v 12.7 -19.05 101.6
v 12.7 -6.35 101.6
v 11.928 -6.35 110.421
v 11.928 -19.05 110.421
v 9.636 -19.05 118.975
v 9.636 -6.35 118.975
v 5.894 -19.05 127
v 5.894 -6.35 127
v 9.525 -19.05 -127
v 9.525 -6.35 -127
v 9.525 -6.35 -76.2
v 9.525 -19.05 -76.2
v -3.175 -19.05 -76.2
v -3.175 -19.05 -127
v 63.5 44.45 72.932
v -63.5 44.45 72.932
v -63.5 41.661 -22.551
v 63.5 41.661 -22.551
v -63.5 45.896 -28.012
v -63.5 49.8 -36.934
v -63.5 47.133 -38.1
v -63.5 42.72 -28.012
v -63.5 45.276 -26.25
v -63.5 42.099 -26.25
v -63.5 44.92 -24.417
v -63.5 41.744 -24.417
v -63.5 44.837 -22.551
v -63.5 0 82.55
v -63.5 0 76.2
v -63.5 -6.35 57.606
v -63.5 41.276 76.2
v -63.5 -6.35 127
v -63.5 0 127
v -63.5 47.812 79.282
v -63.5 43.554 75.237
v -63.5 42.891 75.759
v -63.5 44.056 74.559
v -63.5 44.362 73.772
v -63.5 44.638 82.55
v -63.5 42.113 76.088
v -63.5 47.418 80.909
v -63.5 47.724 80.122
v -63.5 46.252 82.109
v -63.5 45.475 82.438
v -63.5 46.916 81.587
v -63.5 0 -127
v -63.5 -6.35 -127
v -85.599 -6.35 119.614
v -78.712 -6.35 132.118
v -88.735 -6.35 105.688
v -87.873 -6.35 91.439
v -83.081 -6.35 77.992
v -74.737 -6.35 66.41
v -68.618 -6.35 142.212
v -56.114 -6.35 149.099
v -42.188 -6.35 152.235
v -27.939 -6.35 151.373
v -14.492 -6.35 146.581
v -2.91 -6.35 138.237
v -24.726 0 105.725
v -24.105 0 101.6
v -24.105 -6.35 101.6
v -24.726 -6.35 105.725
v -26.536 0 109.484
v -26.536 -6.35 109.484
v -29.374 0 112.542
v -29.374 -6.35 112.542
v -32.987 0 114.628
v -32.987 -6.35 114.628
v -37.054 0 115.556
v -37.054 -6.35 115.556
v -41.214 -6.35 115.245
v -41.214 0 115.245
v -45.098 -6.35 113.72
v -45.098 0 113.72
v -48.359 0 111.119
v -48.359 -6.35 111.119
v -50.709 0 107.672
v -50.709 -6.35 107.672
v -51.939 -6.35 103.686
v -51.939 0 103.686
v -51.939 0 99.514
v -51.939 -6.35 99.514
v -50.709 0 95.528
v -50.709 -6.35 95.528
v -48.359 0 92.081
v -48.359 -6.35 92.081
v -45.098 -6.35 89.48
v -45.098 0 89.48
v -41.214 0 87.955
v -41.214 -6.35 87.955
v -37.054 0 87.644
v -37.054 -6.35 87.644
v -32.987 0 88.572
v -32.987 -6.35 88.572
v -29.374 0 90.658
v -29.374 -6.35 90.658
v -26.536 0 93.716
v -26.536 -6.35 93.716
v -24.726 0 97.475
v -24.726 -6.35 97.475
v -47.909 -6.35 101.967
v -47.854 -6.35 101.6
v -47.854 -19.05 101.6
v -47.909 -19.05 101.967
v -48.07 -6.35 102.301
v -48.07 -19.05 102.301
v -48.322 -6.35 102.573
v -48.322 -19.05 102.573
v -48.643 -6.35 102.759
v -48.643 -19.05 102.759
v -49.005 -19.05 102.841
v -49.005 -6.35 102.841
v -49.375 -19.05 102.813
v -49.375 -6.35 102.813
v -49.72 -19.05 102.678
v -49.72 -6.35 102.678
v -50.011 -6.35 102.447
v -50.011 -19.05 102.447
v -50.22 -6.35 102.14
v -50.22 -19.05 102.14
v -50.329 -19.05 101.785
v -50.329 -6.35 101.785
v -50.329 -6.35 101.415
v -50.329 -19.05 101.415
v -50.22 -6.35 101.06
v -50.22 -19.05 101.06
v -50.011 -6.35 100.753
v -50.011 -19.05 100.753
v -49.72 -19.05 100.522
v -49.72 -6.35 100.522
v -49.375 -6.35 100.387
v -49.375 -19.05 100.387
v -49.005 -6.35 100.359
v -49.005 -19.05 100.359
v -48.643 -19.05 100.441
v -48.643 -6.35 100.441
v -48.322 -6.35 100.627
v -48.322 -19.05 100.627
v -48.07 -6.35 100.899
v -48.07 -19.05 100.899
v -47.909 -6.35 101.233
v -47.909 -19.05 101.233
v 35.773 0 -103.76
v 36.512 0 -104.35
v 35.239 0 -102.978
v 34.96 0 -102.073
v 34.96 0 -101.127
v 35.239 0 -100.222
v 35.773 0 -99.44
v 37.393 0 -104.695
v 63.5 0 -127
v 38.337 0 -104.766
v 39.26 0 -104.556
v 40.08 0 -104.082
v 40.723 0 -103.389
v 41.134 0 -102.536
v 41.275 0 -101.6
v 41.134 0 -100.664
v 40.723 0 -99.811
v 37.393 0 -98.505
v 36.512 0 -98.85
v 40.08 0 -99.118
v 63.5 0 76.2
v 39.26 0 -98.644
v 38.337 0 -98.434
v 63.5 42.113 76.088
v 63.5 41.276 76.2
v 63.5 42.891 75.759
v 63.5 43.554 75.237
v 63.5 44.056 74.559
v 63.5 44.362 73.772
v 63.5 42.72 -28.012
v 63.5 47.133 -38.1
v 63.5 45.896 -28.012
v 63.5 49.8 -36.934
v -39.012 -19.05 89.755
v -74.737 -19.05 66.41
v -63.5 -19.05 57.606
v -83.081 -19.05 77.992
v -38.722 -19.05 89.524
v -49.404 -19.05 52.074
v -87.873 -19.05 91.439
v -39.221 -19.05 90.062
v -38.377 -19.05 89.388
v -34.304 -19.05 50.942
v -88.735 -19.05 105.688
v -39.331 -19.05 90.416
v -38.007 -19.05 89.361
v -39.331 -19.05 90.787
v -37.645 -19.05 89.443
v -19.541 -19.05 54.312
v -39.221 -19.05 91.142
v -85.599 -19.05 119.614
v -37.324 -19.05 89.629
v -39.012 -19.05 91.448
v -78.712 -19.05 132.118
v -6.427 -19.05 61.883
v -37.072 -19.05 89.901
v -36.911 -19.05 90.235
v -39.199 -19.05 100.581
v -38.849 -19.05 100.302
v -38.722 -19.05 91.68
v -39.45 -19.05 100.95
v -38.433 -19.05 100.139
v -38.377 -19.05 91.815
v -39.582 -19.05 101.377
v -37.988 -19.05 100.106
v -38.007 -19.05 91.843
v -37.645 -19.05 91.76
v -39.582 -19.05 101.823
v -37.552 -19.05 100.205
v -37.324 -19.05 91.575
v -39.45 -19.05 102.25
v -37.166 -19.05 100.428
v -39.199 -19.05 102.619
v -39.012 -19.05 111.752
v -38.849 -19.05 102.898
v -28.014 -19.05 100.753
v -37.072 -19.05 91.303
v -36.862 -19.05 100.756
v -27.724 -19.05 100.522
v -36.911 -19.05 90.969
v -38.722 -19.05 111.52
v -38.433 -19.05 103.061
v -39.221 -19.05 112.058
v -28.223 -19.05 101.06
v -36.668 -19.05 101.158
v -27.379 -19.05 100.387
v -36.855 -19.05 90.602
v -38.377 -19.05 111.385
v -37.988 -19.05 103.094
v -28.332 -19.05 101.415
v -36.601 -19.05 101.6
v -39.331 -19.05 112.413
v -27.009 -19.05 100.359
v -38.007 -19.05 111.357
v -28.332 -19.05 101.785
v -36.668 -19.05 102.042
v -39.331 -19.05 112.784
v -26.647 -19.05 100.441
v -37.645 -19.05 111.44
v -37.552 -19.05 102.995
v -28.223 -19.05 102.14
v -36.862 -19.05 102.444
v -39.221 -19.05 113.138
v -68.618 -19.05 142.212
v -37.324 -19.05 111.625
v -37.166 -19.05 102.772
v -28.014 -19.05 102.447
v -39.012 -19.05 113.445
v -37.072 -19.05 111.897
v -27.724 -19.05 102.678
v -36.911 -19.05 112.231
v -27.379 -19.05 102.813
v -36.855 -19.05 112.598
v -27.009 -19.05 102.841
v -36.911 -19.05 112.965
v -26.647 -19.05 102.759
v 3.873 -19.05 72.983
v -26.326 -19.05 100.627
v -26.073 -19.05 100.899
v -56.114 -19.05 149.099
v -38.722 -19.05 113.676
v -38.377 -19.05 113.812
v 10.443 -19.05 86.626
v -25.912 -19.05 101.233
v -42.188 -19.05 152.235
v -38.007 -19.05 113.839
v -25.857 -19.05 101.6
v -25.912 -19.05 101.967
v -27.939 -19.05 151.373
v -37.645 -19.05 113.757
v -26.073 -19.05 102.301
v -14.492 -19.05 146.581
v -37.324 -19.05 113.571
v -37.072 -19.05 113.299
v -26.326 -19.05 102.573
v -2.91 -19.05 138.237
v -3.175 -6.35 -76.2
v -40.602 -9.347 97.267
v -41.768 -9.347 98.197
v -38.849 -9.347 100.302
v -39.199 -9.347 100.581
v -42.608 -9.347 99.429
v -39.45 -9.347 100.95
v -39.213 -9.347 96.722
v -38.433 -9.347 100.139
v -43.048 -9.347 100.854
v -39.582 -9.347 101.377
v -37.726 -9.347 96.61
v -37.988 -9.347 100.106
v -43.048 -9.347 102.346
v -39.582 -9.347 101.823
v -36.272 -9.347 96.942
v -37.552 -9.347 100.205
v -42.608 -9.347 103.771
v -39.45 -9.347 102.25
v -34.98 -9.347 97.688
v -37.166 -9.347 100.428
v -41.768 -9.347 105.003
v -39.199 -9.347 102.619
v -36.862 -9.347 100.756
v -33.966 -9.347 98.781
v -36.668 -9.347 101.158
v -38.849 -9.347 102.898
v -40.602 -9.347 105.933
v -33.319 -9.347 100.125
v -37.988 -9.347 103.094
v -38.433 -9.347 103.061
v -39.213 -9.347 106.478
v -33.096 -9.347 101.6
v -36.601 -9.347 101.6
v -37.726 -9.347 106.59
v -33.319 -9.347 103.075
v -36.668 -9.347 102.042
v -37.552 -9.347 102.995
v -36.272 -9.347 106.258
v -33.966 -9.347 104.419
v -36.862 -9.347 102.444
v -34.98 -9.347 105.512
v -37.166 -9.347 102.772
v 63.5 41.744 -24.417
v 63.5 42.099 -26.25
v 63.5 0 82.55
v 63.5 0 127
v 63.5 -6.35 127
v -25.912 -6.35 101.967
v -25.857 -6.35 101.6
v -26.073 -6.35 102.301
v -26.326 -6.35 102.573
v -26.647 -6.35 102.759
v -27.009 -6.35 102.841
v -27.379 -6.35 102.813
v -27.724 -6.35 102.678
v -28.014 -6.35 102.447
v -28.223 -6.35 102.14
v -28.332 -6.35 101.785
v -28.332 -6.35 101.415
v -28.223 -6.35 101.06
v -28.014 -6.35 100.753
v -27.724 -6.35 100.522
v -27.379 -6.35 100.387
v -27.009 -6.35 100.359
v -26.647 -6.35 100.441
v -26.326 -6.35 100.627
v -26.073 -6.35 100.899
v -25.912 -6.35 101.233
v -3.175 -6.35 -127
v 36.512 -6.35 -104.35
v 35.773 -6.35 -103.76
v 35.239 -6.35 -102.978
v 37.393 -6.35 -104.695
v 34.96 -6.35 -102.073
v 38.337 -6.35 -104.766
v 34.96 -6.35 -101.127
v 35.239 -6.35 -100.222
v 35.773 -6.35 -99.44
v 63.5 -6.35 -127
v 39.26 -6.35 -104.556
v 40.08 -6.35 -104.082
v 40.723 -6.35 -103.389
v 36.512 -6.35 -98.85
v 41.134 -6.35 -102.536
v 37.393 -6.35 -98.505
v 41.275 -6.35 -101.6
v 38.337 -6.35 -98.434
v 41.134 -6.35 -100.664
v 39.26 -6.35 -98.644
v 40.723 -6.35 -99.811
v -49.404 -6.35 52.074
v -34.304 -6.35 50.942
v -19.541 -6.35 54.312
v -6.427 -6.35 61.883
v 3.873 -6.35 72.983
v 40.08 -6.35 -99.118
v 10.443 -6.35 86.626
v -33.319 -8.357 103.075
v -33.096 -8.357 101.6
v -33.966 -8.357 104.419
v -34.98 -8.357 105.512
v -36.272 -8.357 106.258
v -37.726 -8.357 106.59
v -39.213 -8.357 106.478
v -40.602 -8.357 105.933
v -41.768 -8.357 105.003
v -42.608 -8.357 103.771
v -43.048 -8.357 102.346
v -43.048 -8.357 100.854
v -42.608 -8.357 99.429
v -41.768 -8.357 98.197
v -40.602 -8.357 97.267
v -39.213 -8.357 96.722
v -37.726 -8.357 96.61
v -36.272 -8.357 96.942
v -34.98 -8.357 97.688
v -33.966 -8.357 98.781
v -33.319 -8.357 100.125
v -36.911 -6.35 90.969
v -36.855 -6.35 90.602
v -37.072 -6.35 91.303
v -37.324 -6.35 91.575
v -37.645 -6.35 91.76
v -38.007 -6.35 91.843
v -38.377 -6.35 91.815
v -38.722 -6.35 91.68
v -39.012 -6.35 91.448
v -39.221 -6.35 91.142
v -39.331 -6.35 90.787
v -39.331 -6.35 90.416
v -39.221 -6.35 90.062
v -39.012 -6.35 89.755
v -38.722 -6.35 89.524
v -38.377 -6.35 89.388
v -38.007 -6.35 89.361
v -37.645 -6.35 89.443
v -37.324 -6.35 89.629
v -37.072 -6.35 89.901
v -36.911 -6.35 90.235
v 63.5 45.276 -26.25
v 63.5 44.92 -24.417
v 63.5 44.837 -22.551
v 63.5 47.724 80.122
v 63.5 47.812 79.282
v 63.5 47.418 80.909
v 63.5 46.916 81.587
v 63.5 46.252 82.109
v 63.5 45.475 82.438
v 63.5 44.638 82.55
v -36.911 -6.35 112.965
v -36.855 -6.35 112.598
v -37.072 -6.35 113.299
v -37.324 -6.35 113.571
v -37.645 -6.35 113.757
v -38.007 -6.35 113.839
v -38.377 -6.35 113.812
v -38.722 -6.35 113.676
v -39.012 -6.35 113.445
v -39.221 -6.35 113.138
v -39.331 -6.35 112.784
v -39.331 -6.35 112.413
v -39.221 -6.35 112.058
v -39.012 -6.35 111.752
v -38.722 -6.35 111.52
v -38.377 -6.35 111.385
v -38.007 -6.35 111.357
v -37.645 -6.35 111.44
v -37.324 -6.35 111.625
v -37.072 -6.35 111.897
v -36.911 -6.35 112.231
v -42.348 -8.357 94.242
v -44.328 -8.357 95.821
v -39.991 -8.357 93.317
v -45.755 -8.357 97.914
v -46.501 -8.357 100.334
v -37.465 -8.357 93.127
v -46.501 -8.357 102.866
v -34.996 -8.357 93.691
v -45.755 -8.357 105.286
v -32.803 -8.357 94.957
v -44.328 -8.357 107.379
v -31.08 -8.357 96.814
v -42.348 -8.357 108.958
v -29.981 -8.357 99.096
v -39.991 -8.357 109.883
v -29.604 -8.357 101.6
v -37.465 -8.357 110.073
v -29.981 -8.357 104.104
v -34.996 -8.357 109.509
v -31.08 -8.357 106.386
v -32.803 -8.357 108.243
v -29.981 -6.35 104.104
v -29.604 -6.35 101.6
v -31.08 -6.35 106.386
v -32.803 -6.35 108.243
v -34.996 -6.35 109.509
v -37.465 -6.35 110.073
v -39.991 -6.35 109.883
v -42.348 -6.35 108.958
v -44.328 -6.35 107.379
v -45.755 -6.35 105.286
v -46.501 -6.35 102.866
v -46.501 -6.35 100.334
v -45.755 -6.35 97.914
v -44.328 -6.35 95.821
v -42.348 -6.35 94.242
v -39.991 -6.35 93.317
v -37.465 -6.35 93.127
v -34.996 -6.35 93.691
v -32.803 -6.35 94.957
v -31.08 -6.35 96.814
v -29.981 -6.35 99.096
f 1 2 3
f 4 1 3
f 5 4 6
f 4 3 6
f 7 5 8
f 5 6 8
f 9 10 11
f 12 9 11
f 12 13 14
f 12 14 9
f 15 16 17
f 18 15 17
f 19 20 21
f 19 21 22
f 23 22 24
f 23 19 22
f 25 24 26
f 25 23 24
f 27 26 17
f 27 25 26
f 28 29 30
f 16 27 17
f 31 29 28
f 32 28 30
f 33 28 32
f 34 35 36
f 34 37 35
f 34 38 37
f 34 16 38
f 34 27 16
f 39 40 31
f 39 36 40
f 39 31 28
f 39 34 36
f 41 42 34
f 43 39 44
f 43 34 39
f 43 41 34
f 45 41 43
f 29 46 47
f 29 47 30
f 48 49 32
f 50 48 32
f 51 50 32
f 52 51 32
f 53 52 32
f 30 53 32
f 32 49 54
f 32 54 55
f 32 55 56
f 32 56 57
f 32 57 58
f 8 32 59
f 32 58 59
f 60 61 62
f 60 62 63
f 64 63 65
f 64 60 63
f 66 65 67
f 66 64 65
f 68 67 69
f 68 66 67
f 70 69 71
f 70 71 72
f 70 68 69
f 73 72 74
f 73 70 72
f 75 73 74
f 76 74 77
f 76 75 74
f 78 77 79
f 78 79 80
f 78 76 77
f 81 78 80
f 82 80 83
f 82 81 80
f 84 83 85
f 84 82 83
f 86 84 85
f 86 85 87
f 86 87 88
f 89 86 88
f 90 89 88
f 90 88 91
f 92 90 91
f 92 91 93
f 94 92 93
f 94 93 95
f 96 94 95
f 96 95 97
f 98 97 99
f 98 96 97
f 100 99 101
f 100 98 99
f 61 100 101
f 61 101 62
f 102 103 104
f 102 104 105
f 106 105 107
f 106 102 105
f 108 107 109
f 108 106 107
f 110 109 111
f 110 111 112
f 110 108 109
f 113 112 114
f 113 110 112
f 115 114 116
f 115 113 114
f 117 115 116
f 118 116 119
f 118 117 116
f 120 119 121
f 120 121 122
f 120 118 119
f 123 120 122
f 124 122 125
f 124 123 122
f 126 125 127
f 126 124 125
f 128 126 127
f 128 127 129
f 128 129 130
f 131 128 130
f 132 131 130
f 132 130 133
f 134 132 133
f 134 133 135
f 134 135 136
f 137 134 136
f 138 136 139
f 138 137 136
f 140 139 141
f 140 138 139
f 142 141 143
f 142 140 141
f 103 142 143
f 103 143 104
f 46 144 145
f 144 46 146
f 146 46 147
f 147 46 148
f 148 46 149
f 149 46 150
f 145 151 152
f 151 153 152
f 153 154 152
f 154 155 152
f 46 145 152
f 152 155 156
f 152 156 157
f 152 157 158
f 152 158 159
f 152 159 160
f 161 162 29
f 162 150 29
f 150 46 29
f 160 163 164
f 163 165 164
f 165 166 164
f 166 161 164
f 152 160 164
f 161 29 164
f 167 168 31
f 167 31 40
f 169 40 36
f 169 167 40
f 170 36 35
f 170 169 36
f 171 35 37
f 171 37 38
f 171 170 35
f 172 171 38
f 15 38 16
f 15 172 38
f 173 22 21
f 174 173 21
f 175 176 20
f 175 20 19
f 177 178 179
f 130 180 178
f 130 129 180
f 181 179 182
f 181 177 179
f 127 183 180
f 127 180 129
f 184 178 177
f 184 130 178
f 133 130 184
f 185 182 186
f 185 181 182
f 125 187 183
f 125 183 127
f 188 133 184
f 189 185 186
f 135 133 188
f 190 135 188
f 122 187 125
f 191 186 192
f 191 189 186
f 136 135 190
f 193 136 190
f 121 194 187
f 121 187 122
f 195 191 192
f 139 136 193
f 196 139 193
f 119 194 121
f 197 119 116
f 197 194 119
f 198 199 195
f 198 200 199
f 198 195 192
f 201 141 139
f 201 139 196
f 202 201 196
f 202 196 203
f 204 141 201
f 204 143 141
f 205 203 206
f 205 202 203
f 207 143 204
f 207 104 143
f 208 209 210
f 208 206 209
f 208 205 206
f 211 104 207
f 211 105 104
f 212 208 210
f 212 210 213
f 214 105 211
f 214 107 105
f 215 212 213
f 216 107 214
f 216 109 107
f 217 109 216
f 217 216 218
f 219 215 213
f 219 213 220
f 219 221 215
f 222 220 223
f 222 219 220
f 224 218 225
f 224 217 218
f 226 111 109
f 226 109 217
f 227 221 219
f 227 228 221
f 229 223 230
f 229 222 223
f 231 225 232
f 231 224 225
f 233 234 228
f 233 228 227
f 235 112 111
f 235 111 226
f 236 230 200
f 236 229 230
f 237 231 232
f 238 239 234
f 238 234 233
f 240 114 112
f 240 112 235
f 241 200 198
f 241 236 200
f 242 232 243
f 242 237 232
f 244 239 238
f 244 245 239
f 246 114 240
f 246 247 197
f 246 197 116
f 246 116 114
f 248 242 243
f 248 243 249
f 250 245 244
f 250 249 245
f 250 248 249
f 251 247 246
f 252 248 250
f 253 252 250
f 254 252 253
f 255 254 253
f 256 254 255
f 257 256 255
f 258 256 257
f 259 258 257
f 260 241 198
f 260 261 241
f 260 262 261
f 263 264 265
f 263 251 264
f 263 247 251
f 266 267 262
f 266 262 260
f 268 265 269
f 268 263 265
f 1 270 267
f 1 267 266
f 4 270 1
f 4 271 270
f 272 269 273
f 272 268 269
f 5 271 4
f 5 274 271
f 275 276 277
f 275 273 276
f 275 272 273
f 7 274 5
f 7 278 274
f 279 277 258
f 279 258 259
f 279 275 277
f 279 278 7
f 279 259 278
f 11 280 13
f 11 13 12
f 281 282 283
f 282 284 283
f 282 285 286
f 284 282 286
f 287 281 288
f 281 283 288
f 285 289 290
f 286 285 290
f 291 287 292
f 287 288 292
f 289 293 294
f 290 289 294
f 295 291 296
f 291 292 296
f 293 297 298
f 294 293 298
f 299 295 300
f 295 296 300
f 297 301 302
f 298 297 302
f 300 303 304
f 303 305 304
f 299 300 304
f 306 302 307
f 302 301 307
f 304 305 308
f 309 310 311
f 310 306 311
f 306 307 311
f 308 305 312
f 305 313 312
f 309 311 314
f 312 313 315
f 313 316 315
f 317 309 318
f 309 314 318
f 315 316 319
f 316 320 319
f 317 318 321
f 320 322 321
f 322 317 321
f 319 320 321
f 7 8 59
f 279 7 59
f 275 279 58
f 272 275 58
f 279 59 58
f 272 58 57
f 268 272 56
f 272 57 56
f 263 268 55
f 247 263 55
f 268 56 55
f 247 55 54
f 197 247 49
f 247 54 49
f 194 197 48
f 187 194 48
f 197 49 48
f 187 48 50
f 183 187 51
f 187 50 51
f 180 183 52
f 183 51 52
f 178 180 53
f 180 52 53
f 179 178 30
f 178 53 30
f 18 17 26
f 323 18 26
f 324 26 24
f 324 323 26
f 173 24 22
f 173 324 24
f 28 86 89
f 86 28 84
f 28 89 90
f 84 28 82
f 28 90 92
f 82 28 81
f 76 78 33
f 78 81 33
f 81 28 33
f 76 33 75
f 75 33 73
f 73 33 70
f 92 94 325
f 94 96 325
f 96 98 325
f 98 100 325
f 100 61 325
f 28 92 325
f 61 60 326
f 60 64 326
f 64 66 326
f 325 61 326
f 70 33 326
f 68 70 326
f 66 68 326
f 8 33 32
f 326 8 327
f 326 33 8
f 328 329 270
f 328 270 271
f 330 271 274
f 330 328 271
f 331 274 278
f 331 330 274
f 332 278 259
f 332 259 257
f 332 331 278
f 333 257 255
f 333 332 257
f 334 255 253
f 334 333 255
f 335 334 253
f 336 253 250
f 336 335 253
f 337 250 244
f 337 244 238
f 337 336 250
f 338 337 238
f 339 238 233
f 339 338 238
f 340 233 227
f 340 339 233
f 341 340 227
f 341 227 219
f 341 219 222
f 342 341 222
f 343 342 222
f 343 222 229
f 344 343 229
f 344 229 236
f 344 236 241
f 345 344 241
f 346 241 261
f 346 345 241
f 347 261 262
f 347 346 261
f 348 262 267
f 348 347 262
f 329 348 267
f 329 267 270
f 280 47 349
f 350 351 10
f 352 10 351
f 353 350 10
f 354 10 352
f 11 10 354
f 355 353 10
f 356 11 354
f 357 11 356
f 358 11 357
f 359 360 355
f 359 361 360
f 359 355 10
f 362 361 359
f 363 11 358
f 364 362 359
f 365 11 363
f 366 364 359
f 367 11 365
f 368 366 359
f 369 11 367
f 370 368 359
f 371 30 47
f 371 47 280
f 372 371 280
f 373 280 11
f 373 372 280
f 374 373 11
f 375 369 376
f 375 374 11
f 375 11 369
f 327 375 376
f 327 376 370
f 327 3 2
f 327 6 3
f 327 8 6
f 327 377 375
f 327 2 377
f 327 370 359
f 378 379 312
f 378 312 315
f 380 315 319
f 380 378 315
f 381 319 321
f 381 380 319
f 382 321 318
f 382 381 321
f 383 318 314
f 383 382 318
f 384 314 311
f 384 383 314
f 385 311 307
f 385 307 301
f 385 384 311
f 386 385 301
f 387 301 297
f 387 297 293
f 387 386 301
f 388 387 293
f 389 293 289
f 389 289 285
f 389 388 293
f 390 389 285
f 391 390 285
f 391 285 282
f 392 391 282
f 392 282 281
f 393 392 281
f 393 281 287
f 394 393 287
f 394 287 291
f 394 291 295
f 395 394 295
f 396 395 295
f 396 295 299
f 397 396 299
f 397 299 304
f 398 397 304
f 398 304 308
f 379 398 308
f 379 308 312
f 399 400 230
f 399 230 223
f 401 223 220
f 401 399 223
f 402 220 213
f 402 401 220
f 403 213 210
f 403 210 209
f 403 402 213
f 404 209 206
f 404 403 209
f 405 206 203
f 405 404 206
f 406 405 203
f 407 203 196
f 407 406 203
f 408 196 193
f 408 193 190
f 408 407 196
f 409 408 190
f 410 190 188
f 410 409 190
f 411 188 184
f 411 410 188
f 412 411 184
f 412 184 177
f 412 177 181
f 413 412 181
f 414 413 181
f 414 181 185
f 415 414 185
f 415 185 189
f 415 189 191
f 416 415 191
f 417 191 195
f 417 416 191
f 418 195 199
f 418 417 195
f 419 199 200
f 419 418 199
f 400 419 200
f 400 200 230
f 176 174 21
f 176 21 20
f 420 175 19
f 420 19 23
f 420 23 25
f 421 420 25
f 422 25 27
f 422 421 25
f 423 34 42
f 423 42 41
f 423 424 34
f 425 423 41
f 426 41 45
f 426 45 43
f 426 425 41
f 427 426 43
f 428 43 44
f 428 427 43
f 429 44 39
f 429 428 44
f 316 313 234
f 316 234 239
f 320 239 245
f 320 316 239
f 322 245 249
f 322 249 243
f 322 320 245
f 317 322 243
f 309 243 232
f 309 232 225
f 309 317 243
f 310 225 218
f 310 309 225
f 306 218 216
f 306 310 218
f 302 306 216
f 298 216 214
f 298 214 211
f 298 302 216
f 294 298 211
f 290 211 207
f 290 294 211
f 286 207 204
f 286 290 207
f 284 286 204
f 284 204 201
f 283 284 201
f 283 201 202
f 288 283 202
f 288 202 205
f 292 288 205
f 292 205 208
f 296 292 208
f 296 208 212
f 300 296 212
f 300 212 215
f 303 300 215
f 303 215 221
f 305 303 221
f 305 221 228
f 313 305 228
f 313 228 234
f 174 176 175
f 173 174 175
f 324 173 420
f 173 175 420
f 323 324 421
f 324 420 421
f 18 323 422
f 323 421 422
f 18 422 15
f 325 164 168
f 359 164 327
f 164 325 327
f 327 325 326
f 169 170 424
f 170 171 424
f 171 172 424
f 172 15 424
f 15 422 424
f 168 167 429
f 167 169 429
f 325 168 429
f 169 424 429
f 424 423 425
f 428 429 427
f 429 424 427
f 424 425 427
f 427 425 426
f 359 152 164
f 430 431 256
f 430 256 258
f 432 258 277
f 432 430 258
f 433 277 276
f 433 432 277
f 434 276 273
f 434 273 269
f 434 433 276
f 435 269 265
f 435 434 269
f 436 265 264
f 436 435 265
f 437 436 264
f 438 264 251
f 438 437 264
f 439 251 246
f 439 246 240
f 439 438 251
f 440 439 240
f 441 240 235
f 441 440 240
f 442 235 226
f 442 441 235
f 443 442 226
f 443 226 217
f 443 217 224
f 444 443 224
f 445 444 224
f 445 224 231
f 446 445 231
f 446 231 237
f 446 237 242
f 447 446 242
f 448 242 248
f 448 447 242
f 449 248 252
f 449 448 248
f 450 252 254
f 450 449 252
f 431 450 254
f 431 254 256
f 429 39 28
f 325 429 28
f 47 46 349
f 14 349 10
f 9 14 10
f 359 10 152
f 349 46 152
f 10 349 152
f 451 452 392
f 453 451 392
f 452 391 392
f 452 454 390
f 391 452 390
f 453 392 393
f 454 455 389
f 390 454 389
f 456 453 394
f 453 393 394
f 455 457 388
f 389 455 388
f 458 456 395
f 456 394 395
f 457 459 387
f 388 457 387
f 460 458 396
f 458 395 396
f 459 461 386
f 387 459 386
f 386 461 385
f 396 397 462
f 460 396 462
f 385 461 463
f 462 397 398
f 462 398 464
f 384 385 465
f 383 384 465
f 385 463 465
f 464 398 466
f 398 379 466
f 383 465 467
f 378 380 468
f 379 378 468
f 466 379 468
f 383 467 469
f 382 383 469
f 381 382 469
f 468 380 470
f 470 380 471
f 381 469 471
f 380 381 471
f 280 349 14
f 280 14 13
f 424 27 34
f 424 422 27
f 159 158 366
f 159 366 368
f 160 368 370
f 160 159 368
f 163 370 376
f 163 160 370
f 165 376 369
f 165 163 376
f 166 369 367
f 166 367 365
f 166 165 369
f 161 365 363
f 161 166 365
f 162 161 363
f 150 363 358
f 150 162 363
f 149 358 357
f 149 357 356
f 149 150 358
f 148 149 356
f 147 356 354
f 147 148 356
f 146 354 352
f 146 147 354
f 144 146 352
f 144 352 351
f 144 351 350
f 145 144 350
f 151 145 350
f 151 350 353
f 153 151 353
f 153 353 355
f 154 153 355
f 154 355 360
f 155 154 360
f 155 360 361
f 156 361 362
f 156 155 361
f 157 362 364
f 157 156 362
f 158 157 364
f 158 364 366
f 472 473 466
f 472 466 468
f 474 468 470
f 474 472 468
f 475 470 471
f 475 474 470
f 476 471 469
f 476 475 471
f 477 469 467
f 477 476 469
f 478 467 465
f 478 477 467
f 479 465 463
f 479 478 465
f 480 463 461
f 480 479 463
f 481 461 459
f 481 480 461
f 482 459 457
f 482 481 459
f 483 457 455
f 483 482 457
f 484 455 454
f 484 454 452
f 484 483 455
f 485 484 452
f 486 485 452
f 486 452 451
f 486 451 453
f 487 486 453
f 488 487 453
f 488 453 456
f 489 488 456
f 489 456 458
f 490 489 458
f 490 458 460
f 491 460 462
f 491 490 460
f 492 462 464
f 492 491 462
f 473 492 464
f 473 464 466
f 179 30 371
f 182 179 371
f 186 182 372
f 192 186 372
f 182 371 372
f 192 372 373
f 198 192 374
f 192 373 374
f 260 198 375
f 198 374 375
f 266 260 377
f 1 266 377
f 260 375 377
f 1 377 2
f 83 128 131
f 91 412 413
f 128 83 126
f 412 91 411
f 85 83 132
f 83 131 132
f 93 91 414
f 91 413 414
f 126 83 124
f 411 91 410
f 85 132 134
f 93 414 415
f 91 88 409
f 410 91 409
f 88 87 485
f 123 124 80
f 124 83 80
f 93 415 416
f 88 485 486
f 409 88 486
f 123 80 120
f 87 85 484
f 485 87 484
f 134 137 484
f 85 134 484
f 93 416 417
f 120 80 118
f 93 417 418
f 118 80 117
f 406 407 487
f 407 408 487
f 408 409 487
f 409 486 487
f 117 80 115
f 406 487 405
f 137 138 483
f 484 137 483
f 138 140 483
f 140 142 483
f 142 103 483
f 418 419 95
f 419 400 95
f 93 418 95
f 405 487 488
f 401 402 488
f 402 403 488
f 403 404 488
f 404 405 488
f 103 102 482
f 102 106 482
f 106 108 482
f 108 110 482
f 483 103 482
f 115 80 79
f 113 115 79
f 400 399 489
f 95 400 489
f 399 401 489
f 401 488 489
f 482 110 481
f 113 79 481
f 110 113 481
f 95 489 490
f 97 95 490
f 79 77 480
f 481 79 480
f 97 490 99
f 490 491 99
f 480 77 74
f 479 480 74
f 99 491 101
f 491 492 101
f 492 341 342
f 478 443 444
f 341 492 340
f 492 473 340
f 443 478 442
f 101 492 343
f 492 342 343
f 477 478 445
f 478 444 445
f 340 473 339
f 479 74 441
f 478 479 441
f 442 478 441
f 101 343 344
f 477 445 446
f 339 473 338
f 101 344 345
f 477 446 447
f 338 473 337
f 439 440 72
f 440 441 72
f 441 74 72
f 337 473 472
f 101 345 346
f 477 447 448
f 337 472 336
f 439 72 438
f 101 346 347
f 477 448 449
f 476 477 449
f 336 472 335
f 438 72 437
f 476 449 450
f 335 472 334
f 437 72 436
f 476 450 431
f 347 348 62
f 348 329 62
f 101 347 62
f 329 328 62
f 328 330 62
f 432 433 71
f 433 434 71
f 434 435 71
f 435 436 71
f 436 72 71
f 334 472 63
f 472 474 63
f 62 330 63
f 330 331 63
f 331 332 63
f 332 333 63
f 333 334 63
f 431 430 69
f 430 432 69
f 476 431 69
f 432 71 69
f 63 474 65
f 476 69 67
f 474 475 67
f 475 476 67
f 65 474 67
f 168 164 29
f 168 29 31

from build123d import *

# Parameters (mm, degrees)
F0_W     = 127
F0_H     = 254
F0_R     = 3.175
F0_R_2   = 13.9954
F1_DEPTH = 6.35
F3_DEPTH = 63.5
F4_R     = 13.9954
F4_R_2   = 1.2446
F4_R_3   = 8.4963
F4_R_4   = 5.0038
F4_R_5   = 1.4986
F4_W     = 12.7
F4_H     = 50.8
F5_DEPTH = 12.7
F6_DEPTH = 2.0066
F7_DEPTH = 2.9972


with BuildPart() as f1:
    # F0 (on Front) → F1 (new body)
    with BuildSketch(Plane.XZ):
        Rectangle(F0_W, F0_H)
        with Locations((-38.1, -101.6)):
            Circle(F0_R, mode=Mode.SUBTRACT)
        with Locations((38.1, -101.6)):
            Circle(F0_R, mode=Mode.SUBTRACT)
        with Locations((-38.1, 101.6)):
            Circle(F0_R_2, mode=Mode.SUBTRACT)
        with Locations((38.1, 101.6)):
            Circle(F0_R, mode=Mode.SUBTRACT)
        with Locations((38.1, 101.6)):
            Circle(F0_R)
        with Locations((-38.1, -101.6)):
            Circle(F0_R)
    extrude(amount=F1_DEPTH)

    # F2 (on Right) → F3 (join, symmetric)
    with BuildSketch(Plane.YZ):
        with BuildLine():
            Line((44.638204, 82.55), (0, 82.55))
            Line((0, 82.55), (0, 76.2))
            Line((0, 76.2), (41.276354, 76.2))
            ThreePointArc((41.276354, 76.2), (43.553959, 75.237044), (44.45, 72.932292))
            Line((44.45, 72.932292), (41.660755, -22.550628))
            ThreePointArc((41.660755, -22.550628), (41.887722, -25.339829), (42.720032, -28.011611))
            Line((42.720032, -28.011611), (47.133445, -38.1))
            Line((47.133445, -38.1), (49.799549, -36.933647))
            Line((49.799549, -36.933647), (45.896387, -28.011611))
            ThreePointArc((45.896387, -28.011611), (45.064076, -25.339829), (44.837109, -22.550628))
            Line((44.837109, -22.550628), (47.81185, 79.282292))
            ThreePointArc((47.81185, 79.282292), (46.91581, 81.587044), (44.638204, 82.55))
        make_face()
    extrude(amount=F3_DEPTH, both=True)

    # F4 (on face) → F5 (join)
    with BuildSketch(Plane.XZ.offset(6.35)):
        with BuildLine():
            Line((-63.5, 57.605909), (-63.5, 73.201937))
            Line((-63.5, 73.201937), (-63.5, 127))
            Line((-63.5, 127), (5.894091, 127))
            ThreePointArc((5.894091, 127), (-74.021024, 137.521024), (-63.5, 57.605909))
        make_face()
        with BuildLine():
            Line((-63.5, 127), (-63.5, 73.201937))
            Line((-63.5, 73.201937), (-63.5, 57.605909))
            ThreePointArc((-63.5, 57.605909), (-12.7, 57.605909), (12.7, 101.6))
            ThreePointArc((12.7, 101.6), (10.969032, 114.748007), (5.894091, 127))
            Line((5.894091, 127), (-63.5, 127))
        make_face()
        with Locations((-38.1, 101.6)):
            Circle(F4_R, mode=Mode.SUBTRACT)
        with Locations((-38.1, 101.6)):
            Circle(F4_R)
        with Locations((-38.1, 90.6018)):
            Circle(F4_R_2, mode=Mode.SUBTRACT)
        with Locations((-49.0982, 101.6)):
            Circle(F4_R_2, mode=Mode.SUBTRACT)
        with Locations((-38.1, 101.6)):
            Circle(F4_R_3, mode=Mode.SUBTRACT)
        with Locations((-38.1, 112.5982)):
            Circle(F4_R_2, mode=Mode.SUBTRACT)
        with Locations((-27.1018, 101.6)):
            Circle(F4_R_2, mode=Mode.SUBTRACT)
        with Locations((-38.1, 101.6)):
            Circle(F4_R_3)
        with Locations((-38.1, 101.6)):
            Circle(F4_R_4, mode=Mode.SUBTRACT)
        with Locations((-38.1, 101.6)):
            Circle(F4_R_4)
        with Locations((-38.1, 101.6)):
            Circle(F4_R_5, mode=Mode.SUBTRACT)
        with Locations((3.175, -101.6)):
            Rectangle(F4_W, F4_H)
    extrude(amount=F5_DEPTH)

    # F4 (on face) → F6 (cut)
    with BuildSketch(Plane.XZ.offset(6.35)):
        with Locations((-38.1, 101.6)):
            Circle(F4_R_3)
        with Locations((-38.1, 101.6)):
            Circle(F4_R_4, mode=Mode.SUBTRACT)
        with Locations((-38.1, 101.6)):
            Circle(F4_R_4)
        with Locations((-38.1, 101.6)):
            Circle(F4_R_5, mode=Mode.SUBTRACT)
    extrude(amount=F6_DEPTH, mode=Mode.SUBTRACT)

    # F4 (on face) → F7 (cut)
    with BuildSketch(Plane.XZ.offset(6.35)):
        with Locations((-38.1, 101.6)):
            Circle(F4_R_4)
        with Locations((-38.1, 101.6)):
            Circle(F4_R_5, mode=Mode.SUBTRACT)
    extrude(amount=F7_DEPTH, mode=Mode.SUBTRACT)


solid = f1.part
